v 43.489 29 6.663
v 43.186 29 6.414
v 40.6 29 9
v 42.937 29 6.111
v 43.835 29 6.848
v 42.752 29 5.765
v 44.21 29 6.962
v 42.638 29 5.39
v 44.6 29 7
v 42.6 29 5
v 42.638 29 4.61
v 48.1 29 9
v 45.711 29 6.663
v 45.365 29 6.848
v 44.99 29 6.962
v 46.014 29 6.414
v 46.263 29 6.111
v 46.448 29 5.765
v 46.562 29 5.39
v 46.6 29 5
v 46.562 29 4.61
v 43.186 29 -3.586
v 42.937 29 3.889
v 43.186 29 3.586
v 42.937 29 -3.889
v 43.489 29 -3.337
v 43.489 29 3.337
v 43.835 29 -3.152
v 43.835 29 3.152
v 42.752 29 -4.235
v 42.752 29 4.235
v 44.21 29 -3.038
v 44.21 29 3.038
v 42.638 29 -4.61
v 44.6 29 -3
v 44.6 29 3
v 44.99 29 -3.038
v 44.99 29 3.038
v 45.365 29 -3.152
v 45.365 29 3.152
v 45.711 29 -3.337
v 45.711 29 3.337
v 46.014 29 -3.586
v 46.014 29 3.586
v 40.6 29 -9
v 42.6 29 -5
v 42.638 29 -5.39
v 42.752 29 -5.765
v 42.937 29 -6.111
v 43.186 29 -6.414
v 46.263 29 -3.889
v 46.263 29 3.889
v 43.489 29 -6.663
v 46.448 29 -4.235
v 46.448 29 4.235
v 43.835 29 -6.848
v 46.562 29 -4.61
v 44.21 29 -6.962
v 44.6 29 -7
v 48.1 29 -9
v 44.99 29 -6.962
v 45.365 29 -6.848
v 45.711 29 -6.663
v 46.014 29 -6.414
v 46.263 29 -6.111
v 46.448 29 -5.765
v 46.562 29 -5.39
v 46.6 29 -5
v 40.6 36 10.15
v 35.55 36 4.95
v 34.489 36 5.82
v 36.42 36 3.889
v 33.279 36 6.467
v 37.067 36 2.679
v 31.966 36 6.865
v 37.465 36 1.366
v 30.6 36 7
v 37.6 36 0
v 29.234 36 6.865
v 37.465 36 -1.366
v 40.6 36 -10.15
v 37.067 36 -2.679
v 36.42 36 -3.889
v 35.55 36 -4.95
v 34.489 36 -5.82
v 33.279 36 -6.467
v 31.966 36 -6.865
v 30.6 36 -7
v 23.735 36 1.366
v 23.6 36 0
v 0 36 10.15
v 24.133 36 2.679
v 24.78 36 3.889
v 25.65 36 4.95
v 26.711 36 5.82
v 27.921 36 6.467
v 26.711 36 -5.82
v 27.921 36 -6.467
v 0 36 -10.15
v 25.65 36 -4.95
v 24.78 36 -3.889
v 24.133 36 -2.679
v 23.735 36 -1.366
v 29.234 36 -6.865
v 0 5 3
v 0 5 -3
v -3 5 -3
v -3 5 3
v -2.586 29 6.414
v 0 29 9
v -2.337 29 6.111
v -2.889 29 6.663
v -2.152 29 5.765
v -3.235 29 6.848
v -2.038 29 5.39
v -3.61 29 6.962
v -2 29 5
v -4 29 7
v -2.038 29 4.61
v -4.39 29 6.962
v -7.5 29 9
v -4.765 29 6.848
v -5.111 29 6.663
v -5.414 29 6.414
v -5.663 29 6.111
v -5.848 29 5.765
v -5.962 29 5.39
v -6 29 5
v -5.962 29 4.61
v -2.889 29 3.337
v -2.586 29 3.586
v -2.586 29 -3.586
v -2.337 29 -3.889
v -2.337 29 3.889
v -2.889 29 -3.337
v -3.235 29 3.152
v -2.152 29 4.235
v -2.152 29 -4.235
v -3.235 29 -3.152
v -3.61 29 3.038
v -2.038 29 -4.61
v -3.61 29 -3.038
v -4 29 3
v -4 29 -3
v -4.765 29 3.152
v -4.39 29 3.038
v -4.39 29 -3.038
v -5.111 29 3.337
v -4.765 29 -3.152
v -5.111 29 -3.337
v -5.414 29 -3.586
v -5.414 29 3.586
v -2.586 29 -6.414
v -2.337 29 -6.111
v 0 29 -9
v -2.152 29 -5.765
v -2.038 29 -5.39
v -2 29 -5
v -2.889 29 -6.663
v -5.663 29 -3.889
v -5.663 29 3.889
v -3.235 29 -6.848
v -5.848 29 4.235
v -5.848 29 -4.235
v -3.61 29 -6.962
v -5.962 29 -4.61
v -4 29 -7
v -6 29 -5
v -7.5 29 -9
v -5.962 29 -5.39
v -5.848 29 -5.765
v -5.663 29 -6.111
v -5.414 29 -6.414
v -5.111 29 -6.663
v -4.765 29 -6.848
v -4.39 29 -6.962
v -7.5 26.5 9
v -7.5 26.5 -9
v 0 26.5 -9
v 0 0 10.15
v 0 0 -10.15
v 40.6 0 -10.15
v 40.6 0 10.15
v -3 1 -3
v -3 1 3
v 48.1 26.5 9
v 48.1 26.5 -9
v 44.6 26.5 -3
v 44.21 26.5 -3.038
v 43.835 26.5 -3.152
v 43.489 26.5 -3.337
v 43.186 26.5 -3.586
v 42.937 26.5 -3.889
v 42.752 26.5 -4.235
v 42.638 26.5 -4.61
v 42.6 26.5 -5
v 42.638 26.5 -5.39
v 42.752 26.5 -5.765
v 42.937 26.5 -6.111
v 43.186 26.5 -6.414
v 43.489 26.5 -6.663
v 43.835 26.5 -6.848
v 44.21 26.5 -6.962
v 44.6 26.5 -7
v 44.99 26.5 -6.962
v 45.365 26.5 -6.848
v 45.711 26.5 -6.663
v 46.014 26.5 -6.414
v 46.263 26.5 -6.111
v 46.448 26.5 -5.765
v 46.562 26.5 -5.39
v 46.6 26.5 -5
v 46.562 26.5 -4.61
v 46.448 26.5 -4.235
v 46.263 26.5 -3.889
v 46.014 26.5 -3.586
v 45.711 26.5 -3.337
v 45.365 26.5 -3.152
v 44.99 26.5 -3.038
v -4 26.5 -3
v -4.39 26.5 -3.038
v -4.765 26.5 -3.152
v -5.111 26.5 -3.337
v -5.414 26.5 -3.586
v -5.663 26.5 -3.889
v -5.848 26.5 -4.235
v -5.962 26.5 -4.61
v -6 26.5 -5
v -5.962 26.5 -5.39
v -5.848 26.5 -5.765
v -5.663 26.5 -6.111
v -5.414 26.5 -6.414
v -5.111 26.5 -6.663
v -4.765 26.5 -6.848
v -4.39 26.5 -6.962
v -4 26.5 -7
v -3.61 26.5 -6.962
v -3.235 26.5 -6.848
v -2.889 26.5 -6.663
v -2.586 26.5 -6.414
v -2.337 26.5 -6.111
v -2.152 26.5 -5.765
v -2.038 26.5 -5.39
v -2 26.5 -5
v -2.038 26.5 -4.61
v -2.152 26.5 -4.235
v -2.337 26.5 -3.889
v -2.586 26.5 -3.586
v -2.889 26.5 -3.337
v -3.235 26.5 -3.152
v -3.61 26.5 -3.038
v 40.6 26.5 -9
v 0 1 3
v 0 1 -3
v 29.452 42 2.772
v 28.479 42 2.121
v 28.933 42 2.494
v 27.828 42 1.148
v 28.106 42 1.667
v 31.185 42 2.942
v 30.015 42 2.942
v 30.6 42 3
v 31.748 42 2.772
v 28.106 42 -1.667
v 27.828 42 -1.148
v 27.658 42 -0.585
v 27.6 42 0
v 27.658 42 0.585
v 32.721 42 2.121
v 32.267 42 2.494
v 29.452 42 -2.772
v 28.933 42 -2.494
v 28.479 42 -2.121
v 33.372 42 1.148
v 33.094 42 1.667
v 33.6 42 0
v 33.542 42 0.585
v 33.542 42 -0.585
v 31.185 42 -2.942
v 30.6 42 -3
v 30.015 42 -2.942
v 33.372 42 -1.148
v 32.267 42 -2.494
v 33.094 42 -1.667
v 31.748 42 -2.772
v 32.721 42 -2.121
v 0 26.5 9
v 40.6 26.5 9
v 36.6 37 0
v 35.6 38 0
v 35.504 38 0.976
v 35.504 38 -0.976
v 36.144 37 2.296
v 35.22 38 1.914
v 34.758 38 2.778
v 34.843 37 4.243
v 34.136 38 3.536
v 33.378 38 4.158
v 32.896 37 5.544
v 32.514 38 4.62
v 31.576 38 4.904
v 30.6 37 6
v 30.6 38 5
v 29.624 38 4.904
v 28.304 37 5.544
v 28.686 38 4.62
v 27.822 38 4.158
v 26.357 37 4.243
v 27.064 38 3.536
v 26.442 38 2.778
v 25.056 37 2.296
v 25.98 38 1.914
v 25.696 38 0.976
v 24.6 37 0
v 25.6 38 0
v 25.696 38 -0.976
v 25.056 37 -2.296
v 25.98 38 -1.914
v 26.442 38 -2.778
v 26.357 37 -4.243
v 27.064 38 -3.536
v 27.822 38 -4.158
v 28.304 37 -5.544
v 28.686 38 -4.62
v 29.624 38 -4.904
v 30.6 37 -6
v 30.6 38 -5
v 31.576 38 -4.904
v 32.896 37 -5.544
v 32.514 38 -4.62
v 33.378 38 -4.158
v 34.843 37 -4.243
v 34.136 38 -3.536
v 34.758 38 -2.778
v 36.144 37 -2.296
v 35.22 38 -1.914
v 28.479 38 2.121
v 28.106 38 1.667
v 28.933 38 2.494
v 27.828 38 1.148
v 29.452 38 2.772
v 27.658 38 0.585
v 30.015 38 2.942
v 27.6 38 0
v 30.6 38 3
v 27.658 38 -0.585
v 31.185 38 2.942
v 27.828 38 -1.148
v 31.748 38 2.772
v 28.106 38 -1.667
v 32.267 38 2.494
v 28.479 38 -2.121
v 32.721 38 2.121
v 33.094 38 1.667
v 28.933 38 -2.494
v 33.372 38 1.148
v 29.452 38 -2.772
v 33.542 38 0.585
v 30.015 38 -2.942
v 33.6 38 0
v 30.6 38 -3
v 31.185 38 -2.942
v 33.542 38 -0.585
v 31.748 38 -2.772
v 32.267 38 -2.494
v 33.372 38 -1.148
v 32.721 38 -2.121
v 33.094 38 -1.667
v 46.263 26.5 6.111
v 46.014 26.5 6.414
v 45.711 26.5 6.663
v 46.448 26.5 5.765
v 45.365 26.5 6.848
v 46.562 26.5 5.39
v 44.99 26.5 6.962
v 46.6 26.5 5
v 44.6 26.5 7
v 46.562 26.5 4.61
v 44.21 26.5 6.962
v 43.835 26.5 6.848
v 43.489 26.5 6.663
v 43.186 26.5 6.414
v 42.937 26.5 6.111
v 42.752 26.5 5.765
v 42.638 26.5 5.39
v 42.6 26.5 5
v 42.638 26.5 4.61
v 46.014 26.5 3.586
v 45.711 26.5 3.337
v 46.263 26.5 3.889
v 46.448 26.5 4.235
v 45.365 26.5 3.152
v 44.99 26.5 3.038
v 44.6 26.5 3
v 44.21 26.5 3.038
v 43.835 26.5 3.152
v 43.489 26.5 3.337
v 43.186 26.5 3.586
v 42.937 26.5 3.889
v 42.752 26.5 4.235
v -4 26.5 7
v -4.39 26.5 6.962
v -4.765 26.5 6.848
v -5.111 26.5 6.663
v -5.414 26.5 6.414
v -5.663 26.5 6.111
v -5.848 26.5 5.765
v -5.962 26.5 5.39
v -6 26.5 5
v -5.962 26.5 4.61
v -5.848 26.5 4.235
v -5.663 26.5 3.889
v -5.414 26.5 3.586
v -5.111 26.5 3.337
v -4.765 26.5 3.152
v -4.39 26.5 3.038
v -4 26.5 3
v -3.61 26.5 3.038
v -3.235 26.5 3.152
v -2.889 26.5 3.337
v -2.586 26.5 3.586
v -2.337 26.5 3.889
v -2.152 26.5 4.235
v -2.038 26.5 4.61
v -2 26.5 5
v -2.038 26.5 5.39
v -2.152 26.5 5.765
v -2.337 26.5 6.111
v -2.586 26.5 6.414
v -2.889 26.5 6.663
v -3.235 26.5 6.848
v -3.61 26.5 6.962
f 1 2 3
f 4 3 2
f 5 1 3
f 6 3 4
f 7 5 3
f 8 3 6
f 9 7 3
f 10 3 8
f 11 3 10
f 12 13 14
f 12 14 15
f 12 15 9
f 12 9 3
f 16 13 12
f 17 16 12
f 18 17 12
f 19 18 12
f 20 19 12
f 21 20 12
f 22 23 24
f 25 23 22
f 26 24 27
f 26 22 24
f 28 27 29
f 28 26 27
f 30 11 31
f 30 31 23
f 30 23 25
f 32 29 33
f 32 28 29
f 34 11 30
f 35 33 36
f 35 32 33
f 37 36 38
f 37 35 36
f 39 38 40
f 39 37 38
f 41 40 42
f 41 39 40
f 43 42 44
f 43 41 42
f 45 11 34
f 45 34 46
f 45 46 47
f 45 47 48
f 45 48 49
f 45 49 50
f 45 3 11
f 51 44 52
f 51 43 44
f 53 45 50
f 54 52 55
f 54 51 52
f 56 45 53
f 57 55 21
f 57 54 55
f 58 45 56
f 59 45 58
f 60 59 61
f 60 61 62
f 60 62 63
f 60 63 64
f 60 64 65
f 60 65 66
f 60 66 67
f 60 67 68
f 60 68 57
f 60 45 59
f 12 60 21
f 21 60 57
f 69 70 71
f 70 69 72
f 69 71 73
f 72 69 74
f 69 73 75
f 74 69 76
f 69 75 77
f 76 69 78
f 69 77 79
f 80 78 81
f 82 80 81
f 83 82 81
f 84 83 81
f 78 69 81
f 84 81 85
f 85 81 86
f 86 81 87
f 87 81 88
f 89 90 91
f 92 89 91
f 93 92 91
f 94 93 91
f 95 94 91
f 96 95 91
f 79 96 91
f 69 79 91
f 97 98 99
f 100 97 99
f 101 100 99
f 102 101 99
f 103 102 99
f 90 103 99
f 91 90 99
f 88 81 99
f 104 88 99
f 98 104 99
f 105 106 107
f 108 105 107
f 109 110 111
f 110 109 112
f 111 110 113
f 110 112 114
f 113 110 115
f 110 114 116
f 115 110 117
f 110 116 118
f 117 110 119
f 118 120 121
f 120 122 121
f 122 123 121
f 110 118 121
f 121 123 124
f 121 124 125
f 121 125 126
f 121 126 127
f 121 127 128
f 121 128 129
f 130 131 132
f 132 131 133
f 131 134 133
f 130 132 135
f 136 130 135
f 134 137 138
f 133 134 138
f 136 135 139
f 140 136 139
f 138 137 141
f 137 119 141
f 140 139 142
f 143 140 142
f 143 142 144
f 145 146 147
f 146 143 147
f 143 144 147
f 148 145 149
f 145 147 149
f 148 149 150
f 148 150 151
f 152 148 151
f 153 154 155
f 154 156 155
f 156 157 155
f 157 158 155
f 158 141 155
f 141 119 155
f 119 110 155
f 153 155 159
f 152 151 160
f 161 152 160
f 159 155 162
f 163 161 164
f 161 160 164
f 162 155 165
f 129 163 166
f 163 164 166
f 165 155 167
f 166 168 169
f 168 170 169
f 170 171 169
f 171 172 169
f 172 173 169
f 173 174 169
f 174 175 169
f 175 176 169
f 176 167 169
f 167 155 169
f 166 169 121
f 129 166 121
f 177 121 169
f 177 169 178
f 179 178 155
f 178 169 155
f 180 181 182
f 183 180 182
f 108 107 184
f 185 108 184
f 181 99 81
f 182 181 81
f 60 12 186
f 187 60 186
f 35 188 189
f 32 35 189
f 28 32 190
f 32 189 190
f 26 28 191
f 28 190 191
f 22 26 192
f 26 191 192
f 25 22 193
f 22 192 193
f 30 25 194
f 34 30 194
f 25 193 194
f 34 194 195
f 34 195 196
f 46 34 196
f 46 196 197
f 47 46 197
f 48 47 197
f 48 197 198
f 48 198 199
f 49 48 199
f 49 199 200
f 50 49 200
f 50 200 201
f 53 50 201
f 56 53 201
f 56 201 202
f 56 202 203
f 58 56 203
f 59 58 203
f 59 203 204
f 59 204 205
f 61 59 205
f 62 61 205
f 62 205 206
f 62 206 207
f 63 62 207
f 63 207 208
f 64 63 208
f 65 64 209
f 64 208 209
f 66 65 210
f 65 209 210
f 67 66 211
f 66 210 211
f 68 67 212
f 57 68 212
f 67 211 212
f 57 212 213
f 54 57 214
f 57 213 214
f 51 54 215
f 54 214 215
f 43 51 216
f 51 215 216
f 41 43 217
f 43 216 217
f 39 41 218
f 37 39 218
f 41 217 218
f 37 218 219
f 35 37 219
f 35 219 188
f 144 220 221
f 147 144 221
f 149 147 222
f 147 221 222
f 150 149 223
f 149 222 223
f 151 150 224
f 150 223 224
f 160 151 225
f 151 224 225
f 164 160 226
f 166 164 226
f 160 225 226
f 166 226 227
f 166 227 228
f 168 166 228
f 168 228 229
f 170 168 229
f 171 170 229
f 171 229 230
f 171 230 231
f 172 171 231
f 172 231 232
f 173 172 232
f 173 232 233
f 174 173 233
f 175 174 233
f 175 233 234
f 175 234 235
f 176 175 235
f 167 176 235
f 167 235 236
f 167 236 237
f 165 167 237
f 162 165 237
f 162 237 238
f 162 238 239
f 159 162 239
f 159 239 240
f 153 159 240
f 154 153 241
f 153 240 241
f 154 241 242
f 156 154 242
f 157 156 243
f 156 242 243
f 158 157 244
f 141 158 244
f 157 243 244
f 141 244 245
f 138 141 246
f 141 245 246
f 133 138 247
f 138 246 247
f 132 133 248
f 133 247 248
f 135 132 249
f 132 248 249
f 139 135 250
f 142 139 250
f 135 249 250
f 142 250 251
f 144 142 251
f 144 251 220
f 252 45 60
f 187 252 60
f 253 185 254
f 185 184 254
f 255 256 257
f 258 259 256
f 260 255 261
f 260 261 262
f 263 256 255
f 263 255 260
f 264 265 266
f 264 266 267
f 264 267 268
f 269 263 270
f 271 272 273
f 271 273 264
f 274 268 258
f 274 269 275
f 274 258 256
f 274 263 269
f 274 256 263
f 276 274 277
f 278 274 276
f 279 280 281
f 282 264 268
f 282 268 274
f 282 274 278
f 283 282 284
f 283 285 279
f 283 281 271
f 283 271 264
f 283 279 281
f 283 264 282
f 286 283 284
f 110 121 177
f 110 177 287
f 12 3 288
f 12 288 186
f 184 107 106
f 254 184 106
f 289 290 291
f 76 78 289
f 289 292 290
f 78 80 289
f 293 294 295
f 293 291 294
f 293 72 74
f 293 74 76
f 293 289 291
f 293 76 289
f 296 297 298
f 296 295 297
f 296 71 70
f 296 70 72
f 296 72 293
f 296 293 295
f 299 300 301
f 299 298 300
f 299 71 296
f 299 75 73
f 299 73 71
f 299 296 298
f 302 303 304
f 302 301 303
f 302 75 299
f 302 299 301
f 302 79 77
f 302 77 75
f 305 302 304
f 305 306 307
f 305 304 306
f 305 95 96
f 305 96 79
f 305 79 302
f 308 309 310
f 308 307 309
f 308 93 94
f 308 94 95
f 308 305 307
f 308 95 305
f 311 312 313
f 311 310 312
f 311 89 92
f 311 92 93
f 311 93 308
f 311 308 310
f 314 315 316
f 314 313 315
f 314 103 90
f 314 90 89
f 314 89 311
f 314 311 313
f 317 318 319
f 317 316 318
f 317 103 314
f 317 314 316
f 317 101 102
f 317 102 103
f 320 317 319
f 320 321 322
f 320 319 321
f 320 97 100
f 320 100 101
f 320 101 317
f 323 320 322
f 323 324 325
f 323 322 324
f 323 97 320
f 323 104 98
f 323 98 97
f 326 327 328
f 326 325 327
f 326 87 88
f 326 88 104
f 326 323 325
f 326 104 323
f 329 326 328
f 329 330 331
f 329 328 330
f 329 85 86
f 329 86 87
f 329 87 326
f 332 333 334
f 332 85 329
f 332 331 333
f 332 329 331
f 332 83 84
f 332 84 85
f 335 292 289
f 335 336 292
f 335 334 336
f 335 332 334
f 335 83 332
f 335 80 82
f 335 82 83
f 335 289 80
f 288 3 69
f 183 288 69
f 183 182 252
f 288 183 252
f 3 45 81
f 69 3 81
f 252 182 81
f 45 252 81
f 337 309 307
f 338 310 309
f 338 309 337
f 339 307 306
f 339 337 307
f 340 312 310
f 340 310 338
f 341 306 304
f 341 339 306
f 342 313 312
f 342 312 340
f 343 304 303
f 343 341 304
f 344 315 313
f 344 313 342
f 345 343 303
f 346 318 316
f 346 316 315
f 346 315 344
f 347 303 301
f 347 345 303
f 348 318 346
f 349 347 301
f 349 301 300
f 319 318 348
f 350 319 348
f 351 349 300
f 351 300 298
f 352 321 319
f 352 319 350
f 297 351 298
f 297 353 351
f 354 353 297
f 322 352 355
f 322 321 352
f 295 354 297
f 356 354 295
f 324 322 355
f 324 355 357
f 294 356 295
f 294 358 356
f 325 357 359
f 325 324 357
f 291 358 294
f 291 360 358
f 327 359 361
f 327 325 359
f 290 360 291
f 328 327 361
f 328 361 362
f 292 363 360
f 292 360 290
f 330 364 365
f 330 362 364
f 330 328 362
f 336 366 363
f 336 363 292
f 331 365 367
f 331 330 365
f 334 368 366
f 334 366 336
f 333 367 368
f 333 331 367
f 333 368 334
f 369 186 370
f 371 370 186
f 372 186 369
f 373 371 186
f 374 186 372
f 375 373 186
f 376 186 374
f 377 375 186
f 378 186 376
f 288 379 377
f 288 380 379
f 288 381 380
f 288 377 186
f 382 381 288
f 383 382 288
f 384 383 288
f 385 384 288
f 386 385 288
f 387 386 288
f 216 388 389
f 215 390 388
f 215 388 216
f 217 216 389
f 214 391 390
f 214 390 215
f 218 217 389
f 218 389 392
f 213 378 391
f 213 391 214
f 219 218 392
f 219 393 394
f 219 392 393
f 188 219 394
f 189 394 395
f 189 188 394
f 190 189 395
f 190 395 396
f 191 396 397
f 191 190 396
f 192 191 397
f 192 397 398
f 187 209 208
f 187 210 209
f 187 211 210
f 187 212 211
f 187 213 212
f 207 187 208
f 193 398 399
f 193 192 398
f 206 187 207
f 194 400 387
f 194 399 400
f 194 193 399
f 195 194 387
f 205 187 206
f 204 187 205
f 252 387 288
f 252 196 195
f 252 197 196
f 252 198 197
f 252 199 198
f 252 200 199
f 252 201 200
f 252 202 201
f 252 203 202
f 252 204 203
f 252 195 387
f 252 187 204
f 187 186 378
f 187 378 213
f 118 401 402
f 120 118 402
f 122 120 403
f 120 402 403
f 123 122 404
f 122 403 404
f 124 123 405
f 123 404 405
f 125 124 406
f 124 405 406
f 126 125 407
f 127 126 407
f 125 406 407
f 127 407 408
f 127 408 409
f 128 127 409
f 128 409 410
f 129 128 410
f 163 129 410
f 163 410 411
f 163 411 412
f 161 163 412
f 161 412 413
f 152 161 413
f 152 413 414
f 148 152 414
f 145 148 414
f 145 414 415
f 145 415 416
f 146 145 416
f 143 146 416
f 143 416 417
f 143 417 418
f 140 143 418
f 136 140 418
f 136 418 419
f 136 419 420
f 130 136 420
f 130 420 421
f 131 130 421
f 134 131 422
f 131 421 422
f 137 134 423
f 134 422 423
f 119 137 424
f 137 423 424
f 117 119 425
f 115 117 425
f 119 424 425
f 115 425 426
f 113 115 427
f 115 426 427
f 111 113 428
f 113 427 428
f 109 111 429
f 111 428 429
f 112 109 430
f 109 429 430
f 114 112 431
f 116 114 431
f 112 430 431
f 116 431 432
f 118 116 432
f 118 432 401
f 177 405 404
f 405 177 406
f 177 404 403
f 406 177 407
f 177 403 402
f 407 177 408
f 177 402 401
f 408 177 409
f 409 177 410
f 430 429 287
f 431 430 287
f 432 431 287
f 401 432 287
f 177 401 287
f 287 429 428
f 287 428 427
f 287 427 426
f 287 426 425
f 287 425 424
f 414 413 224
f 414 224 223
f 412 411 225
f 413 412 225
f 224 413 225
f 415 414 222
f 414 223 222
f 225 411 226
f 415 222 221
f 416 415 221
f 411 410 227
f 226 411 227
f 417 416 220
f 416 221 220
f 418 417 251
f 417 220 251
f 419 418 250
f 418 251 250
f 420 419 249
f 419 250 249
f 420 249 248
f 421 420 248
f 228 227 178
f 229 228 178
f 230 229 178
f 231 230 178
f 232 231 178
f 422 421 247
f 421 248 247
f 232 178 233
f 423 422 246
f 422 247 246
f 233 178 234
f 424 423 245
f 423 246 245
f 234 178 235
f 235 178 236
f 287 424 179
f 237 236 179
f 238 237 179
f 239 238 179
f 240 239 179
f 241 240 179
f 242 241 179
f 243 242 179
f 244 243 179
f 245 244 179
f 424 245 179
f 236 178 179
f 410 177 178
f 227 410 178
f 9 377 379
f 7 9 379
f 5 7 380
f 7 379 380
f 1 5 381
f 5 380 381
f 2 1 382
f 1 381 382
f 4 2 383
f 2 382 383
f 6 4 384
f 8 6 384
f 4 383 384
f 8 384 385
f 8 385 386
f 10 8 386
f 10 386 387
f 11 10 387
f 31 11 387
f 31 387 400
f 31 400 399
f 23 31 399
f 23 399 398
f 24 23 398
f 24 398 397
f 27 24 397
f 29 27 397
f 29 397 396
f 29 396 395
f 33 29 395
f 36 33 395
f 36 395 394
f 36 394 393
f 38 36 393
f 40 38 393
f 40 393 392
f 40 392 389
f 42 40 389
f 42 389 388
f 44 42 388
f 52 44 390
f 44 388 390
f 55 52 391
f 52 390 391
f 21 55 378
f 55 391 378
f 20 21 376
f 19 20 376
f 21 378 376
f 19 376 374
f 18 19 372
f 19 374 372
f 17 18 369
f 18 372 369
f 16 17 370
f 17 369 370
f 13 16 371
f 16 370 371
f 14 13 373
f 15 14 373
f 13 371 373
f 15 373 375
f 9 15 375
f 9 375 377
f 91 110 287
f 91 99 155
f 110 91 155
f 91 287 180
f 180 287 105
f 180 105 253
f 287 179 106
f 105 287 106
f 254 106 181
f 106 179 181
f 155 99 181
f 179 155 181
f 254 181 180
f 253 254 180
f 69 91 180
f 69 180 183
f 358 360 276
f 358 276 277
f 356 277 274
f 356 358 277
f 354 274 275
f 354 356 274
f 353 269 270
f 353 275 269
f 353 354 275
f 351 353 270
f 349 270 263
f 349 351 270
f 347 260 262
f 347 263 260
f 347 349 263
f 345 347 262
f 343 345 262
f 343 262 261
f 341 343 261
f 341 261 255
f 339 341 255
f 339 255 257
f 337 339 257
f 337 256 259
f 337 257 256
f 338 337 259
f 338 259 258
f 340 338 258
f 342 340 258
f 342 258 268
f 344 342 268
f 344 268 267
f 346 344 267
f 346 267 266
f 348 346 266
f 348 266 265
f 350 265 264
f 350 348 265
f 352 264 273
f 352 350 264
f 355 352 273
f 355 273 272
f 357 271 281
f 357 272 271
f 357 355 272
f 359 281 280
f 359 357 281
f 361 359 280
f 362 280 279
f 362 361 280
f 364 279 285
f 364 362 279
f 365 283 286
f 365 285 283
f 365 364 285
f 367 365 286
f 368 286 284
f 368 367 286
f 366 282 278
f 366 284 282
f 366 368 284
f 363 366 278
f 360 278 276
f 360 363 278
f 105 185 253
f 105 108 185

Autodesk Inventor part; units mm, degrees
ref_plane "YZ Plane" through (0, 0, 0) normal (1, 0, 0) x (0, 1, 0)
ref_plane "XZ Plane" through (0, 0, 0) normal (0, 1, 0) x (-1, 0, 0)
ref_plane "XY Plane" through (0, 0, 0) normal (0, 0, 1) x (1, 0, 0)
sketch "Sketch1" plane through (0, 0, 0) normal (0, 0, 1) x (1, 0, 0)
  line L0 (0, 0) -> (40.6, 0)
  line L1 (40.6, 0) -> (40.6, 36)
  line L2 (40.6, 36) -> (0, 36)
  line L3 (0, 36) -> (0, 0)
  line L4 (0, 29) -> (-7.5, 29)
  line L5 (-7.5, 29) -> (-7.5, 26.5)
  line L6 (-7.5, 26.5) -> (0, 26.5)
  line L7 (0, 26.5) -> (0, 29)
  line L8 (40.6, 29) -> (48.1, 29)
  line L9 (48.1, 29) -> (48.1, 26.5)
  line L10 (48.1, 26.5) -> (40.6, 26.5)
  line L11 (40.6, 26.5) -> (40.6, 29)
  line L12 (0, 5) -> (-3, 5)
  line L13 (-3, 5) -> (-3, 1)
  line L14 (-3, 1) -> (0, 1)
  line L15 (0, 1) -> (0, 5)
  dimension "d0" = 40.6
  dimension "d1" = 36
  dimension "d2" = 7.5
  dimension "d3" = 2.5
  dimension "d4" = 7
  dimension "d5" = 3
  dimension "d6" = 4
  dimension "d7" = 1
extrude "Extrusion1" add sketch "Sketch1" along normal mid plane 20.3 contours L3 L2 L1 L0
extrude "Extrusion2" add sketch "Sketch1" along normal mid plane 18 contours L1 L8 L9 L10 | L6 L5 L4 L3
extrude "Extrusion3" add sketch "Sketch1" along normal mid plane 6 contours L14 L13 L12 L3
sketch "Sketch2" plane through (-7.5, 29, 9) normal (0, 1, 0) x (1, 0, 0)
  line L0 (0, 18) -> (0, 0) projected
  line L1 (7.5, 18) -> (7.5, 0) projected
  line L2 (48.1, 0) -> (48.1, 18) projected
  line L3 (55.6, 0) -> (48.1, 0) projected
  line L4 (55.6, 18) -> (55.6, 0) projected
  line L5 (48.1, 18) -> (55.6, 18) projected
  line L6 (3.5, 14) -> (3.5, 4) construction
  line L7 (0, 9) -> (55.6, 9) construction
  line L8 (52.1, 14) -> (52.1, 4) construction
  line L9 (3.5, 4) -> (52.1, 4) construction
  line L10 (52.1, 14) -> (3.5, 14) construction
  point P0 (7.5, 9)
  dimension "d14" = 3.5
  dimension "d15" = 3.5
  dimension "d16" = 10
hole "Hole1" at (-4, 29, -5) at (-4, 29, 5) at (44.6, 29, 5) at (44.6, 29, -5) direction (0, -1, 0) diameter 4 end through all
sketch "Sketch3" plane through (0, 36, 10.15) normal (0, 1, 0) x (1, 0, 0)
  line L0 (40.6, 20.3) -> (40.6, 0) projected
  line L1 (0, 20.3) -> (40.6, 20.3) projected
  circle A0 centre (30.6, 10.15) radius 7
  line L2 (0, 10.15) -> (30.6, 10.15) construction
  circle A1 centre (30.6, 10.15) radius 3
  dimension "d24" = 10
  dimension "d25" = 14
  dimension "d26" = 6
extrude "Extrusion4" add sketch "Sketch3" along normal blind 2
extrude "Extrusion5" add sketch "Sketch3" along normal blind 6 contours A1
chamfer "Chamfer1" distance 2 angle 45 1 edges at (23.6, 38, 0)
properties part number "servo HK15138"
